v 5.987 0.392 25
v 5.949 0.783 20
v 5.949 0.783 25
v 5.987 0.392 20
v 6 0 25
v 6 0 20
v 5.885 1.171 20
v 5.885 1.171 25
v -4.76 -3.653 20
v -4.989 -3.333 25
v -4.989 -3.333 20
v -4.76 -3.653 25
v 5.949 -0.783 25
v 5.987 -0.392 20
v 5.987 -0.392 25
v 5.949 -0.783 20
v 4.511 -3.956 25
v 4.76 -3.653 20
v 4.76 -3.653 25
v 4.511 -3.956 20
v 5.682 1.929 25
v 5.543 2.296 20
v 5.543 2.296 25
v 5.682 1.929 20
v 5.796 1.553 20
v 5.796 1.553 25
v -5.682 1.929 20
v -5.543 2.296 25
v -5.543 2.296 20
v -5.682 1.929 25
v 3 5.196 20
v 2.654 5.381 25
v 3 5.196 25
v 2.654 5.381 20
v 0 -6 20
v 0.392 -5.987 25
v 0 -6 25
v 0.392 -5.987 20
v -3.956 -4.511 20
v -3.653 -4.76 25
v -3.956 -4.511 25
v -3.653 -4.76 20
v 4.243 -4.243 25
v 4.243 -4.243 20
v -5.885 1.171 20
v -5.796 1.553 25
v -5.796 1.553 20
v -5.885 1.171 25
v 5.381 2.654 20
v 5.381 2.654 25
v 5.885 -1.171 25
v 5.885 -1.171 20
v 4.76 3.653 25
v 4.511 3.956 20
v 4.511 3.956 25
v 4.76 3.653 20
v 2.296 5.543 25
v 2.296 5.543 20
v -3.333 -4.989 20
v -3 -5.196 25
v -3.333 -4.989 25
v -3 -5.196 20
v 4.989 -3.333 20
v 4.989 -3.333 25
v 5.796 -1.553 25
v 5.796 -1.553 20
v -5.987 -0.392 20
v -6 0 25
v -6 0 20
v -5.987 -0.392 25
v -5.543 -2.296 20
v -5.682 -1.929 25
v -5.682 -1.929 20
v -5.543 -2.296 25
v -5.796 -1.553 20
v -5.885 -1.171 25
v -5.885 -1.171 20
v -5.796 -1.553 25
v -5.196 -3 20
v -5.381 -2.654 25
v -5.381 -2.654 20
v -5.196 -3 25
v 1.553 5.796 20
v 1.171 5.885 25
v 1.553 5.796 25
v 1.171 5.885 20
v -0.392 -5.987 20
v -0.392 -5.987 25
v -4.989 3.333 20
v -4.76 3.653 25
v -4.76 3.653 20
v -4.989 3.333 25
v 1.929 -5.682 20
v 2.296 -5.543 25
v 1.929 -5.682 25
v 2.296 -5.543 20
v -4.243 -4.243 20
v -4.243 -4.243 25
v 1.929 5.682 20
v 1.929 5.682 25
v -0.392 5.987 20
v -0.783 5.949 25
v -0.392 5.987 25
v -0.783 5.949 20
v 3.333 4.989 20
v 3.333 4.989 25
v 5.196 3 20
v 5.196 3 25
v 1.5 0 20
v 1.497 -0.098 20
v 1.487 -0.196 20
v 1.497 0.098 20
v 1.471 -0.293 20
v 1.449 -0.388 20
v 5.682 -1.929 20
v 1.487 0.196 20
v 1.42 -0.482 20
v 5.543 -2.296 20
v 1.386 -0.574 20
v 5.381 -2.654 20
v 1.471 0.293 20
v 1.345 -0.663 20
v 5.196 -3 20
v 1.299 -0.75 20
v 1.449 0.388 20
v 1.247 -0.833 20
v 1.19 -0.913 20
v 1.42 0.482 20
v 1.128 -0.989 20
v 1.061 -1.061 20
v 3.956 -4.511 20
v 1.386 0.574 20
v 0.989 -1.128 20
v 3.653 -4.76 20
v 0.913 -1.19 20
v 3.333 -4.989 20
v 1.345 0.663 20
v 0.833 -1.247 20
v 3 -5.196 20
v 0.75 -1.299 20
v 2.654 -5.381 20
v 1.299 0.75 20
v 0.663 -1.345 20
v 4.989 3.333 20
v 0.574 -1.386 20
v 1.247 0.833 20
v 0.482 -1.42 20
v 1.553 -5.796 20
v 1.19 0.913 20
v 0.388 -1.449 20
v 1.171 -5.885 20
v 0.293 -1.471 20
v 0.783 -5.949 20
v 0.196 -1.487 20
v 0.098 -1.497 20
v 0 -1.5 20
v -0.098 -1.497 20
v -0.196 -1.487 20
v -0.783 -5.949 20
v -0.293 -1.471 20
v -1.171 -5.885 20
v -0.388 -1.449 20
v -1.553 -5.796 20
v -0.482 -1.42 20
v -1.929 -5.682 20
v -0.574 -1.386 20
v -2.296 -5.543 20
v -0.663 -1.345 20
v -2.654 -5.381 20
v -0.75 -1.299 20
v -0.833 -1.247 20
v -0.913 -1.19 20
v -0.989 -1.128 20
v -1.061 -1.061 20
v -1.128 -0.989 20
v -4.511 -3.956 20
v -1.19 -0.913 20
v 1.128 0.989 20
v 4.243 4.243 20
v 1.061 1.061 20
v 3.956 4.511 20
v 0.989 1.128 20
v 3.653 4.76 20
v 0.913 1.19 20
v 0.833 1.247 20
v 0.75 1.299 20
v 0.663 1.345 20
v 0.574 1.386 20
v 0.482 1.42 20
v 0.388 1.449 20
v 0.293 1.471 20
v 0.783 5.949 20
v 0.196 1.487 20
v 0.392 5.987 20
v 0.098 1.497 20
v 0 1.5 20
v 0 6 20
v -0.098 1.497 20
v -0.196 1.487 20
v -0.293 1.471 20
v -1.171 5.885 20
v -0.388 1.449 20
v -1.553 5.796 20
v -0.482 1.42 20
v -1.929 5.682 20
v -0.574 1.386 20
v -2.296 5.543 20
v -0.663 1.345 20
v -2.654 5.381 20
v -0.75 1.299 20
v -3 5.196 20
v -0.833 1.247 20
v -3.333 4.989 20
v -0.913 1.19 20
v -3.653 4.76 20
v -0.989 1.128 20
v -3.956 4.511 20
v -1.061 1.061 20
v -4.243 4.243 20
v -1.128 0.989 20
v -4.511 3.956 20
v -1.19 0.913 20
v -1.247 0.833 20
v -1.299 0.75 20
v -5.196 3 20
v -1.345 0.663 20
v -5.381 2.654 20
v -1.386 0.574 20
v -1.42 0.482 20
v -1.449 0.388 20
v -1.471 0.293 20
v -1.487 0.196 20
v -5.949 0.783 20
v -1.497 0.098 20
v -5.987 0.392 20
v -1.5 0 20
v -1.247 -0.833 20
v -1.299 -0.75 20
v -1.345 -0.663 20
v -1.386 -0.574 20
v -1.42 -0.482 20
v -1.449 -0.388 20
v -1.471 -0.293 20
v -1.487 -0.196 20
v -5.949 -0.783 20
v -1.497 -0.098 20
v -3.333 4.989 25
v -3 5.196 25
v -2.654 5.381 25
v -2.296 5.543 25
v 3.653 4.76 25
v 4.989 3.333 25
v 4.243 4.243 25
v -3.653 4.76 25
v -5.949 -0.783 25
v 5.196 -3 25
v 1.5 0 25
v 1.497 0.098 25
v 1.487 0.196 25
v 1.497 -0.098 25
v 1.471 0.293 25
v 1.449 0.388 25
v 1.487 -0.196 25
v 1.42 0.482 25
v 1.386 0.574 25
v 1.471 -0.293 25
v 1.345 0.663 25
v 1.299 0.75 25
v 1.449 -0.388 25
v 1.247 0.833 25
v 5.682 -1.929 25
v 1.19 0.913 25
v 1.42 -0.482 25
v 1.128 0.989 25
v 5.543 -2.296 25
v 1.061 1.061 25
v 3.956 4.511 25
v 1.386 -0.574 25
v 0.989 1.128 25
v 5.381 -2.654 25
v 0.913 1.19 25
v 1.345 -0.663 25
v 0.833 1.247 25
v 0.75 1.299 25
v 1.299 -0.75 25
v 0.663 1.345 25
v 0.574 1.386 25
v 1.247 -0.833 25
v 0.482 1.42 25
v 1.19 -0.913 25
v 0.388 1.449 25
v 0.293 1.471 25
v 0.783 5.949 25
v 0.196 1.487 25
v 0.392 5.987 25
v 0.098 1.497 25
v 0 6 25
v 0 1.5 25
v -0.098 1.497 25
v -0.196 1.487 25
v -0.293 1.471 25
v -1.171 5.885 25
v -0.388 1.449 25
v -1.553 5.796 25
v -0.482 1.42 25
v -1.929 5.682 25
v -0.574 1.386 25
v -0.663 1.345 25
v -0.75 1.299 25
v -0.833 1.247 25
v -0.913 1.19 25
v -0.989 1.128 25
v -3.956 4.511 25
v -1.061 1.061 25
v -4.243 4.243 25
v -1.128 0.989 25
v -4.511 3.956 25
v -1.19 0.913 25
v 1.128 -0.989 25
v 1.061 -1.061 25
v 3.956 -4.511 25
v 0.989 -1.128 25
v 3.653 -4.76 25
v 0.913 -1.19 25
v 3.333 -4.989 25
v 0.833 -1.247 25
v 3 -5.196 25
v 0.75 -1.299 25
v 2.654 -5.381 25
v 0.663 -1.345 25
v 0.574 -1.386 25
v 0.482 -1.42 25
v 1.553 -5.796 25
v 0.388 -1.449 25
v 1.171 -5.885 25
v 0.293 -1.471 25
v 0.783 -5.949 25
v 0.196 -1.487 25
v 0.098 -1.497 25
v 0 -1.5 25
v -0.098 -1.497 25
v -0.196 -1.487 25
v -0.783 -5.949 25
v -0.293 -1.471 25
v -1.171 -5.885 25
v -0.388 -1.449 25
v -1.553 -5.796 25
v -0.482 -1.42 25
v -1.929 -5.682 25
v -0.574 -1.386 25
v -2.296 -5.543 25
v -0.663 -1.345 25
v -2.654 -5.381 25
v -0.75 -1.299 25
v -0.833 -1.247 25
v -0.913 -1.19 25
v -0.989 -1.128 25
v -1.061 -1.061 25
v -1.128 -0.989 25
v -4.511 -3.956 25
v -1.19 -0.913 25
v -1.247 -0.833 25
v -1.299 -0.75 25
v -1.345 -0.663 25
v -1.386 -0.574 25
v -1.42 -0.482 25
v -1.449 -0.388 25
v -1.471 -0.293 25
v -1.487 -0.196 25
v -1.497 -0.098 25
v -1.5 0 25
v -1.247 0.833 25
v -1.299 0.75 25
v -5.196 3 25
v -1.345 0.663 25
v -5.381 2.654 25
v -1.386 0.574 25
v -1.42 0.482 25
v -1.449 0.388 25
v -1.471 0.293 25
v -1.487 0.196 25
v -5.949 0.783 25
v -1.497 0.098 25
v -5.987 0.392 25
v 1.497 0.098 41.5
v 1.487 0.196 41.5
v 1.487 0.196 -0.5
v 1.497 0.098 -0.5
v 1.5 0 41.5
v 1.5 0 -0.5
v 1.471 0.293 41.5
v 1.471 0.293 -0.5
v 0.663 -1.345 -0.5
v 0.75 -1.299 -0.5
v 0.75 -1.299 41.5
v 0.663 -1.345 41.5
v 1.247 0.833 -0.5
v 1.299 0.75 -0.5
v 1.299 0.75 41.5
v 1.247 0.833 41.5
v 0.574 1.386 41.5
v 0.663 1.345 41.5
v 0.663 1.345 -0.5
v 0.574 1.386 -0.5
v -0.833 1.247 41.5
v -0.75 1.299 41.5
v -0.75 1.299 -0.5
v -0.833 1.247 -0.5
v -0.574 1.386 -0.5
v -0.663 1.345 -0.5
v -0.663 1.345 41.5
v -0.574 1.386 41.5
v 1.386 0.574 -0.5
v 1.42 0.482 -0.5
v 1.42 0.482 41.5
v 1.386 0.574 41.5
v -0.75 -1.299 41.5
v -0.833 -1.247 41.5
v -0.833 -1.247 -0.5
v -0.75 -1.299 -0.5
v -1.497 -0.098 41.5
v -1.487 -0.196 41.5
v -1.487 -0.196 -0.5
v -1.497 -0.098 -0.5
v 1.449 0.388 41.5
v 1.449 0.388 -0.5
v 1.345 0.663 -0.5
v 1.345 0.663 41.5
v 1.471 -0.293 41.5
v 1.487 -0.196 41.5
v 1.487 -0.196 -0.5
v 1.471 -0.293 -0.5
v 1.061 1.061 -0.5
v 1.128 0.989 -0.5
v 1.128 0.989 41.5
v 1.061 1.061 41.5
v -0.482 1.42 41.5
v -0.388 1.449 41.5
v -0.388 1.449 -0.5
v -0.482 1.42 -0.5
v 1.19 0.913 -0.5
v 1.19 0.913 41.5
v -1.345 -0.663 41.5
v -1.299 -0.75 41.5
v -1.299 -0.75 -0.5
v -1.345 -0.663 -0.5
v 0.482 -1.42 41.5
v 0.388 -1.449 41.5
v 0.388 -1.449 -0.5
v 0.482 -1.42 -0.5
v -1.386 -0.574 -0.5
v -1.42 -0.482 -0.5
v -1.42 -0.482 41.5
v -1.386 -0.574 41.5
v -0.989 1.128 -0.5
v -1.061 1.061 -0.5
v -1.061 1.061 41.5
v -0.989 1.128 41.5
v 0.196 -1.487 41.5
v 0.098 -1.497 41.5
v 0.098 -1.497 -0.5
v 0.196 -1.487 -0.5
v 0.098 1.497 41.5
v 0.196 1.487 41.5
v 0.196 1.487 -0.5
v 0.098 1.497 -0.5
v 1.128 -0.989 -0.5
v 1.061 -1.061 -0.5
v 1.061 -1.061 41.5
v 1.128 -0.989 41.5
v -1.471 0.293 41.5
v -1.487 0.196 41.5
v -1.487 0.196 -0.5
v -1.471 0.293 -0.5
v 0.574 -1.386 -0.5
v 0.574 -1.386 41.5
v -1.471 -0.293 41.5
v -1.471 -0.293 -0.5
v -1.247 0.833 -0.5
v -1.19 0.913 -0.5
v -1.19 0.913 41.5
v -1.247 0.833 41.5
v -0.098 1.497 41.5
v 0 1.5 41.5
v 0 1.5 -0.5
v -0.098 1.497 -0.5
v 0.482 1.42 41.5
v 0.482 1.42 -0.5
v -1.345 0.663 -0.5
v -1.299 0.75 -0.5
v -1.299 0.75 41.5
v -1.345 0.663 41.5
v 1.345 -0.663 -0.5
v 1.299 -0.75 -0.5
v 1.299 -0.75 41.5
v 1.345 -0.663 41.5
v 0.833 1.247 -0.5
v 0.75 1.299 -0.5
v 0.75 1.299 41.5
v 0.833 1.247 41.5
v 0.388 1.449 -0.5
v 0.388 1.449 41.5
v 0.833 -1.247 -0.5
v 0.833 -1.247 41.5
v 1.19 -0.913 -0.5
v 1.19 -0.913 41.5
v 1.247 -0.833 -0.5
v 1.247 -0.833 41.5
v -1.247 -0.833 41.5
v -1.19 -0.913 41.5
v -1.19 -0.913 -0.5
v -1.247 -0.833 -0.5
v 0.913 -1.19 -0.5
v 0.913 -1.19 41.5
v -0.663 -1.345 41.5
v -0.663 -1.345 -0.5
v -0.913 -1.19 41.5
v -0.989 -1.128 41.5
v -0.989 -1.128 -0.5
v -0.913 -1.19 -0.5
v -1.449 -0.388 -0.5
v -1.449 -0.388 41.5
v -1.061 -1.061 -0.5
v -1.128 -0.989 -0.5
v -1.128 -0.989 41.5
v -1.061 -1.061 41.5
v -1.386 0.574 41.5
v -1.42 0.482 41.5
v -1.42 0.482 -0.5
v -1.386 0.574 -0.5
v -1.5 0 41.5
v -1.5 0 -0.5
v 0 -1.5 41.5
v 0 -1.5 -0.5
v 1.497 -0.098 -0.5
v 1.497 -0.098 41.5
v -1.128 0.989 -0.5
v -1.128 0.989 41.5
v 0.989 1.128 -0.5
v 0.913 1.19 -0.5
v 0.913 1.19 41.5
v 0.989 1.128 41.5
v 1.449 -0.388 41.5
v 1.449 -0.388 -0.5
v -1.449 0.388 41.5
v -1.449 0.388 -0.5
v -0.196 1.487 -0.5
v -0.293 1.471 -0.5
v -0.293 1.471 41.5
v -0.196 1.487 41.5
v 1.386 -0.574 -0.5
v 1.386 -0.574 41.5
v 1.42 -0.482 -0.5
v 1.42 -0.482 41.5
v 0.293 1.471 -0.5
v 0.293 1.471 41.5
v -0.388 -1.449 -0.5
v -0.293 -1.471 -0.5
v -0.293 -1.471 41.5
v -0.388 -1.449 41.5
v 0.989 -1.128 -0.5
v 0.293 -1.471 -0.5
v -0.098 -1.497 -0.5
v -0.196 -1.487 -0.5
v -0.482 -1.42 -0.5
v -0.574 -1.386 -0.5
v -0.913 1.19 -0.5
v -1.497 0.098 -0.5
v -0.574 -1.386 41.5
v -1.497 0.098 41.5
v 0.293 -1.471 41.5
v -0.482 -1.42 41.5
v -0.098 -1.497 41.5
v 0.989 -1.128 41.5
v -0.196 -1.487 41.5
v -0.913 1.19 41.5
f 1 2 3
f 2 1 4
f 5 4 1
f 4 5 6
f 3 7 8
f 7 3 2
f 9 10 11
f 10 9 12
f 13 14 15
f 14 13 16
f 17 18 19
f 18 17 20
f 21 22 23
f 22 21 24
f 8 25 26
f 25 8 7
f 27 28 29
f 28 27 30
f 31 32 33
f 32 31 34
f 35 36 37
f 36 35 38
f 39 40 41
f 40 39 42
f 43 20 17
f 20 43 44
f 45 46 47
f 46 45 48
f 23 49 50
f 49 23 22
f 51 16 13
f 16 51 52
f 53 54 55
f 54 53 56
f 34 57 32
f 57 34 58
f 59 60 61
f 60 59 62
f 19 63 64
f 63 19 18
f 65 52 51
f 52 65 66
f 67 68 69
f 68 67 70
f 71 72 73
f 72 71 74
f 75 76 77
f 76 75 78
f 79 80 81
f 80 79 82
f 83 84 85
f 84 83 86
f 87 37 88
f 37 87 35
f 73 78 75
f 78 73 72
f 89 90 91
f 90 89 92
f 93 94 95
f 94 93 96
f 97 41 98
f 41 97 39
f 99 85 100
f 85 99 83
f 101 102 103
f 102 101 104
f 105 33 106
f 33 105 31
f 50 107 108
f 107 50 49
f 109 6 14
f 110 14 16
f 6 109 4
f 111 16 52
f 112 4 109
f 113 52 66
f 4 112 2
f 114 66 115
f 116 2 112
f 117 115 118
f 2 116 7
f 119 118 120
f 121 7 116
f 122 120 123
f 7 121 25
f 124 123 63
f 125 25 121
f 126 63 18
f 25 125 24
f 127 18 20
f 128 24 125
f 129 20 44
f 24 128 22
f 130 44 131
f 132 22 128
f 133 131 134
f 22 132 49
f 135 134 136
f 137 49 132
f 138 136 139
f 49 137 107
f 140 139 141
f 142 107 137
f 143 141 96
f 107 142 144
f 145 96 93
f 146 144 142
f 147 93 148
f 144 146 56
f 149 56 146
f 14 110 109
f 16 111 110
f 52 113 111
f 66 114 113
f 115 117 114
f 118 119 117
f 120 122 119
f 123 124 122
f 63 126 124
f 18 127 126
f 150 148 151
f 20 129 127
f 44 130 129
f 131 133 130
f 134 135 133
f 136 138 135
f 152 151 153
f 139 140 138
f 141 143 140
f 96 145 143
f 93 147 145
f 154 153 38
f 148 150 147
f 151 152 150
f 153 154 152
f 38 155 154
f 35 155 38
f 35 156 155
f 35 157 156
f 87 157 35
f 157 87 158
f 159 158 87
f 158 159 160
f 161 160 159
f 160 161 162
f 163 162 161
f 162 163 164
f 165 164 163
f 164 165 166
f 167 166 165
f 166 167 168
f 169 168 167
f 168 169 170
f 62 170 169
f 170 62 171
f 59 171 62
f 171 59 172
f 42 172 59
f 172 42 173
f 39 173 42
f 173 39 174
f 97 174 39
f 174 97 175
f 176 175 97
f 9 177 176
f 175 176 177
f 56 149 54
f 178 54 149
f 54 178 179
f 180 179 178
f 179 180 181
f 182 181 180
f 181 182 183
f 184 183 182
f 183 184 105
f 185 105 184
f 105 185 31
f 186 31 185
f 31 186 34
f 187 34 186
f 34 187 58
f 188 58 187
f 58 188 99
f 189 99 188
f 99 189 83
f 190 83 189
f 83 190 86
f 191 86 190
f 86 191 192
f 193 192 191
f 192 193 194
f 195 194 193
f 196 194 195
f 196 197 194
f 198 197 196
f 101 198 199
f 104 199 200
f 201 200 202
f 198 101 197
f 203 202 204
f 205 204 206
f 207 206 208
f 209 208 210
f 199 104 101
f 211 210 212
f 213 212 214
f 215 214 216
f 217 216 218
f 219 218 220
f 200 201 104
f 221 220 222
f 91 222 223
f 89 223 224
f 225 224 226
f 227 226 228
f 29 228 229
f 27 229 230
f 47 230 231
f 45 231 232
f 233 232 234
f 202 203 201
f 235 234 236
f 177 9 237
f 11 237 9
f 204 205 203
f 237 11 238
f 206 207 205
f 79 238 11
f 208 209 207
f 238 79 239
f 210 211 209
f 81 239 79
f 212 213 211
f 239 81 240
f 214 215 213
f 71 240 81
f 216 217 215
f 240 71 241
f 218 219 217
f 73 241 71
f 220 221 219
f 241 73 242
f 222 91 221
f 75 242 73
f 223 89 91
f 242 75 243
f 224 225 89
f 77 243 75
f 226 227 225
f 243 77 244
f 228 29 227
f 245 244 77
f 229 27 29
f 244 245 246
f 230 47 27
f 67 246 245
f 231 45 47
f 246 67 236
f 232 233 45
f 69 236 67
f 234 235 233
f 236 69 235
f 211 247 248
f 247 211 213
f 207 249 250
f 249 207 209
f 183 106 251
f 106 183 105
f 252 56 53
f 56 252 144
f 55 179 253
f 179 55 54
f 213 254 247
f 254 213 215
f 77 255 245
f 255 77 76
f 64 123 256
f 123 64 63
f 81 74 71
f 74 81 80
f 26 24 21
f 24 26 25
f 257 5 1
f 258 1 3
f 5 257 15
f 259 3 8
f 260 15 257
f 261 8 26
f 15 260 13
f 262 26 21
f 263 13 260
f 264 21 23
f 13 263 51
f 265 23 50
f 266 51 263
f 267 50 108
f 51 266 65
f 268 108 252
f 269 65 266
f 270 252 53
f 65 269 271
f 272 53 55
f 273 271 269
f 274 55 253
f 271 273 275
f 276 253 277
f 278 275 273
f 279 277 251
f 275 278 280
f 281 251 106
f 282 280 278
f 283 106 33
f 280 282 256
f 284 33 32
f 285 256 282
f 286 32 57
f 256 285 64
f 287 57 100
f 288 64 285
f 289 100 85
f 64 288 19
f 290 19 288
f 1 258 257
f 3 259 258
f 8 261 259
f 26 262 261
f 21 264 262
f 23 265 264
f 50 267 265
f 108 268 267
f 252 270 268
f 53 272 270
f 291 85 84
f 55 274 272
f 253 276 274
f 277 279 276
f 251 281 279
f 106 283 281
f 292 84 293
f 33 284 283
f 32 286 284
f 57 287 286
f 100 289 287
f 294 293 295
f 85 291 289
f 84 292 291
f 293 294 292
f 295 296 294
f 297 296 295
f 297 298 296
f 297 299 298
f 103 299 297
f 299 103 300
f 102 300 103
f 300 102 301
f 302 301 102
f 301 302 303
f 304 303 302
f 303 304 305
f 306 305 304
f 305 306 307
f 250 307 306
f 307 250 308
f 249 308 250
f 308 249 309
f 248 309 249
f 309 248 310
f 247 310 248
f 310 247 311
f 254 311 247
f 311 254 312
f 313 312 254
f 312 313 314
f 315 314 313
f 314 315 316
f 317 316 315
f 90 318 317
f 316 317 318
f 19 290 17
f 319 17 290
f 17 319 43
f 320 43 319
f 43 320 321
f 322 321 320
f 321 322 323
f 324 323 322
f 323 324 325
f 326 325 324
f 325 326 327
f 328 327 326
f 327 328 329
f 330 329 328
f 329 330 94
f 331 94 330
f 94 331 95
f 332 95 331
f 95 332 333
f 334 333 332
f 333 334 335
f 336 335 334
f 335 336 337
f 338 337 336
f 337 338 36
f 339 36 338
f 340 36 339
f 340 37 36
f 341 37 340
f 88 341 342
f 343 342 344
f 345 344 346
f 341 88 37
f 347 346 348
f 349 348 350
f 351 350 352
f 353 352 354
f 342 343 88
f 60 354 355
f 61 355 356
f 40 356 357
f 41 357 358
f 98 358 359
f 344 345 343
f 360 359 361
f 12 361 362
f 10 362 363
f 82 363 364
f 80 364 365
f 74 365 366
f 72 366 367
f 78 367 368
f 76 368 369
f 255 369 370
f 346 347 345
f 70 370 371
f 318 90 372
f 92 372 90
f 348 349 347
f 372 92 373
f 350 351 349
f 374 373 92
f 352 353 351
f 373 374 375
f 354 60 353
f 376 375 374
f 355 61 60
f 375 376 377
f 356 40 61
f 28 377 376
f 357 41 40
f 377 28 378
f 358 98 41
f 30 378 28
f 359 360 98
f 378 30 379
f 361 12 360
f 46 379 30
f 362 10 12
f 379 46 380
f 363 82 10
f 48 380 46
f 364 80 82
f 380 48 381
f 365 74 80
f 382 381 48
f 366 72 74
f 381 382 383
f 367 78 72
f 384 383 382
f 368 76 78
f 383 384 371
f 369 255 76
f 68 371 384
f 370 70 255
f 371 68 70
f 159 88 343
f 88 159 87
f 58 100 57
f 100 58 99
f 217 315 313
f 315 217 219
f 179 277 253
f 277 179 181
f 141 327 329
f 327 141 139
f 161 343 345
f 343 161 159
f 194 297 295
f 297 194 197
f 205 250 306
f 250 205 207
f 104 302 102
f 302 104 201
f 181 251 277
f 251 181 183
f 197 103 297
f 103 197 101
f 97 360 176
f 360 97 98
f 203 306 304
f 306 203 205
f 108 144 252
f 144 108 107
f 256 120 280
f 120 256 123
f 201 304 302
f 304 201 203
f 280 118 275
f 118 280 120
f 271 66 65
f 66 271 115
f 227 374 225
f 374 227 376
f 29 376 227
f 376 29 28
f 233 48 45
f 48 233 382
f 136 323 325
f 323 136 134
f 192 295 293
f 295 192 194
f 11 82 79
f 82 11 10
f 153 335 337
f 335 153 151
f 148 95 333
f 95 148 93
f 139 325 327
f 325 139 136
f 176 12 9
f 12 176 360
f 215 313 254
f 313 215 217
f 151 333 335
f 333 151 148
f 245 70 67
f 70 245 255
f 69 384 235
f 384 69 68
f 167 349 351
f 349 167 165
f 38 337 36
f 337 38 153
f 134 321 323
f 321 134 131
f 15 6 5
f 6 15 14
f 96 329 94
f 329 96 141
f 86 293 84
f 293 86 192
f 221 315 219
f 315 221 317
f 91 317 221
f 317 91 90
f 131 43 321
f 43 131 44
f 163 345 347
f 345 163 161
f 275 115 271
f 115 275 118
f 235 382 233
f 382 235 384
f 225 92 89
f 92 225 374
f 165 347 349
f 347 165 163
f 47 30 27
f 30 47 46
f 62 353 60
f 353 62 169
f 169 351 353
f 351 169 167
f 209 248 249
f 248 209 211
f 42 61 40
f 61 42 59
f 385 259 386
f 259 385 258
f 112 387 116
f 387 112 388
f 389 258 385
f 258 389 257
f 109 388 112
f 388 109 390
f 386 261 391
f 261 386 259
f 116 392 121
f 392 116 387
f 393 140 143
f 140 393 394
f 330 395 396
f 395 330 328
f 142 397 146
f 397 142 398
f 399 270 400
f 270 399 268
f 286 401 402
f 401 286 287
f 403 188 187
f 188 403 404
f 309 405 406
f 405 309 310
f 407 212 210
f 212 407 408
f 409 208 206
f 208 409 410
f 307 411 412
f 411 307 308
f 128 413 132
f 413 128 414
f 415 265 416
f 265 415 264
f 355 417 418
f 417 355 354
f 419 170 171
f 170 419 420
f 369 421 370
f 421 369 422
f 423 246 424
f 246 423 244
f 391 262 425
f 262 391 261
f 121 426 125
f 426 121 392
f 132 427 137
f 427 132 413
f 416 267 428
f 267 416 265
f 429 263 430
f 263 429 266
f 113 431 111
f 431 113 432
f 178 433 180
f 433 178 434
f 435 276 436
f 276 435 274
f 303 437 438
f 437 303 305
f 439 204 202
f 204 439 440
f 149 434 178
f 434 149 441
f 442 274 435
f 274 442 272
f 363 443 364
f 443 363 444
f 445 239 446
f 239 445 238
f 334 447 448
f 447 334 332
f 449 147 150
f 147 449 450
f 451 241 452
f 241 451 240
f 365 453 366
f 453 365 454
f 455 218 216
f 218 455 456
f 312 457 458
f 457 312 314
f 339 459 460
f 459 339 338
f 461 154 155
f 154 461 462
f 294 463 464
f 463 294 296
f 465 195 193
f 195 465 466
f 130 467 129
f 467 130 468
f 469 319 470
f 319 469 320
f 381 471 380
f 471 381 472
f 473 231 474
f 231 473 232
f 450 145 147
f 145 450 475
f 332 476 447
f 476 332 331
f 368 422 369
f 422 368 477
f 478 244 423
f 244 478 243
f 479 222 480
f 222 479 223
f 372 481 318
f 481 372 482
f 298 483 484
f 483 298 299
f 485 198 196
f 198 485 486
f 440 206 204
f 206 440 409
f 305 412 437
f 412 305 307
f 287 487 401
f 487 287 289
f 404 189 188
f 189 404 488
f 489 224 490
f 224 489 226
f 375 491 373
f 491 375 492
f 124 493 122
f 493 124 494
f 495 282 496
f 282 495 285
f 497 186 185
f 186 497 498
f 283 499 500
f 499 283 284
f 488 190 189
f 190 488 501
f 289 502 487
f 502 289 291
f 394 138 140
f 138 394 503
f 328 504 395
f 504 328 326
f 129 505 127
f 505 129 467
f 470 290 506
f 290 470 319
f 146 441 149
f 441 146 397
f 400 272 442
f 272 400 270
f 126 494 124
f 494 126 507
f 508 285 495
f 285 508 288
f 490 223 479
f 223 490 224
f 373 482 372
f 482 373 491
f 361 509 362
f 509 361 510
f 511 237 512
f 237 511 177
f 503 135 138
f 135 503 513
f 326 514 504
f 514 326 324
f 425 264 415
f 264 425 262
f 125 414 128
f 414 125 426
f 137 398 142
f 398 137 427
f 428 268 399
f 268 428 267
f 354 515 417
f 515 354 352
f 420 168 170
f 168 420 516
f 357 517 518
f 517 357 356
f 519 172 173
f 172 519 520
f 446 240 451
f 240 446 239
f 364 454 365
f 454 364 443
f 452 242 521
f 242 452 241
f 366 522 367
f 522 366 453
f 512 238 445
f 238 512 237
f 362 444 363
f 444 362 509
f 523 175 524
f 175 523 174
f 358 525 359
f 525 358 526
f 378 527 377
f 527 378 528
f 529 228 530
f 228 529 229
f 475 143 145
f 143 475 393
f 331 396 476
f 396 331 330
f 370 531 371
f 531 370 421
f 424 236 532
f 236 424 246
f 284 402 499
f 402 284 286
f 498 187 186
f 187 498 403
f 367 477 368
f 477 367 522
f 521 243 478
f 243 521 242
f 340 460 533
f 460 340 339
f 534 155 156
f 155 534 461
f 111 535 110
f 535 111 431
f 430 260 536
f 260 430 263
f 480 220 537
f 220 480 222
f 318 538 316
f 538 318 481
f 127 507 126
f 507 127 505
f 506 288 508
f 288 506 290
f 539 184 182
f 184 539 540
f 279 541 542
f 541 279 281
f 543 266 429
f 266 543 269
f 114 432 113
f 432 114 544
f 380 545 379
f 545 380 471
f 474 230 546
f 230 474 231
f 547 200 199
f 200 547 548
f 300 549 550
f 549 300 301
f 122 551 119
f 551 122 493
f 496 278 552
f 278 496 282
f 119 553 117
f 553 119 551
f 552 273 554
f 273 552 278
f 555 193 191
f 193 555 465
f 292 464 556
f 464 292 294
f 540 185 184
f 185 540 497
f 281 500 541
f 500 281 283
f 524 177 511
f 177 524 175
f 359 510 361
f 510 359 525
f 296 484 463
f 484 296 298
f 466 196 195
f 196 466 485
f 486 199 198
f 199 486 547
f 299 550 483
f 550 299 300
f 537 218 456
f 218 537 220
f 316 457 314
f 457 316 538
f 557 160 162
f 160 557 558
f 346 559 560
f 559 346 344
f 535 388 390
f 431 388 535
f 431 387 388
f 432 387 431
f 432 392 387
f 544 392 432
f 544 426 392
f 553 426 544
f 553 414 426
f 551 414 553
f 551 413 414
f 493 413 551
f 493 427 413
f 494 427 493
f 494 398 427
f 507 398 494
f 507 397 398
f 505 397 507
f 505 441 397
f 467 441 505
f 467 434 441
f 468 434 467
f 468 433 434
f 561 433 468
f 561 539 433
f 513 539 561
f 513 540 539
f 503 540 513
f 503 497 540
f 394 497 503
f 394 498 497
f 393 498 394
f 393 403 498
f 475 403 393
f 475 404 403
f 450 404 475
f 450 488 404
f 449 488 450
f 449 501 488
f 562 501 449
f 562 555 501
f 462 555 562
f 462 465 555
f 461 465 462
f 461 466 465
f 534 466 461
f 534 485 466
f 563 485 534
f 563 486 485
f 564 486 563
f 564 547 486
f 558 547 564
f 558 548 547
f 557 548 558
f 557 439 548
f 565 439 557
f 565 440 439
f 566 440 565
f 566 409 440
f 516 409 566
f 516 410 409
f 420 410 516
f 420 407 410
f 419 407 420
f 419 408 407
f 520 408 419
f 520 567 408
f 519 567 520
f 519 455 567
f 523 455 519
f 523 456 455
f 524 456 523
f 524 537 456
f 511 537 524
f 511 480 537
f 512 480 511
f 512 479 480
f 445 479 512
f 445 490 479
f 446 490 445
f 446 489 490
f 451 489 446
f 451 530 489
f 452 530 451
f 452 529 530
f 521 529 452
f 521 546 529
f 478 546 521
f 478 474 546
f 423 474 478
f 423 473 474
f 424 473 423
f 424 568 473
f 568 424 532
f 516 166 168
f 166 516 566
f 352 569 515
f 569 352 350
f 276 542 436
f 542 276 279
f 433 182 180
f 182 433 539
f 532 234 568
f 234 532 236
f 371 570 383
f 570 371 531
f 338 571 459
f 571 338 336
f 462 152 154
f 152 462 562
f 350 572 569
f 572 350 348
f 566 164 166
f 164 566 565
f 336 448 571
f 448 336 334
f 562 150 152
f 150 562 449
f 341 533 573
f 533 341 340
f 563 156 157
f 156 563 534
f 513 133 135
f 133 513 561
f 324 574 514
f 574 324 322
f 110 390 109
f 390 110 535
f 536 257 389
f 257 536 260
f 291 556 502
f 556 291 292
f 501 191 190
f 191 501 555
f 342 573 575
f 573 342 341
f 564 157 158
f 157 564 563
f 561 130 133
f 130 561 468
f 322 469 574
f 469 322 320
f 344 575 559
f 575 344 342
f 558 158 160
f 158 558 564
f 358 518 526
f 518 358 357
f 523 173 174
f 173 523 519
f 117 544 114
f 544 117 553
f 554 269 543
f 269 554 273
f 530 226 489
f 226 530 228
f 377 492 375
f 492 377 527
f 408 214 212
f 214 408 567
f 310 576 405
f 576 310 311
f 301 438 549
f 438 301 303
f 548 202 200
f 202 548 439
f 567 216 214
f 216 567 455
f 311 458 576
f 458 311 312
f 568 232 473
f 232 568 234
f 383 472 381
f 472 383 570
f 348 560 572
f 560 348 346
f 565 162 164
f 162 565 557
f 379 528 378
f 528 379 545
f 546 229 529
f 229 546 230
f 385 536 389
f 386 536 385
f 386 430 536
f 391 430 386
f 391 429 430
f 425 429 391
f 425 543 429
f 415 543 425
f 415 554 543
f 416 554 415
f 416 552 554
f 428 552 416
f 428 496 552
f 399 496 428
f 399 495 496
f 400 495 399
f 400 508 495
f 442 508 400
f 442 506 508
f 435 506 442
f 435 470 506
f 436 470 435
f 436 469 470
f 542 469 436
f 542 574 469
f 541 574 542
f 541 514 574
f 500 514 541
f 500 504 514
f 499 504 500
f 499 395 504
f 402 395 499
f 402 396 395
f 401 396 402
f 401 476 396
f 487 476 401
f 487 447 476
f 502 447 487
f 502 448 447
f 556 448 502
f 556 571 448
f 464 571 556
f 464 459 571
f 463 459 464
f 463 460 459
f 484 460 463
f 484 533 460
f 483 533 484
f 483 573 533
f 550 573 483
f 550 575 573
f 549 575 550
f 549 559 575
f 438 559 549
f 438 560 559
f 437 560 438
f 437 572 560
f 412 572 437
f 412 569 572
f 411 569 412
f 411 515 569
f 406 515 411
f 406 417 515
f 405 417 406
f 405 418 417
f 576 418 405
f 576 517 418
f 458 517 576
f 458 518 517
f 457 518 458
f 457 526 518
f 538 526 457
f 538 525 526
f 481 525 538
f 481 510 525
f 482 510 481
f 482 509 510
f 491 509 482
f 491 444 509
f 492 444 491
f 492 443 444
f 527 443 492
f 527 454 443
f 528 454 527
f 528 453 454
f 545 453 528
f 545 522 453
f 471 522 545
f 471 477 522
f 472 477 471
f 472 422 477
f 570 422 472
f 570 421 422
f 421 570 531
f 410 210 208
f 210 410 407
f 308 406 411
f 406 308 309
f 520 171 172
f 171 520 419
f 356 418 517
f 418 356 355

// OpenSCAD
// Hose-barb reducer: 8 mm ID -> 5 mm ID
// Print orientation: standing upright along Z

$fn = 96;

// ---- Dimensions (mm) ----
id1      = 8;     // 8 mm tubing inner diameter
id2      = 5;     // 5 mm tubing inner diameter
bore     = 3;     // through-bore diameter
barb_h8  = 10;    // height of 8 mm barbs
barb_h5  = 8;     // height of 5 mm barbs
collar_d = 12;    // collar diameter
z0       = 0;     // start of barbs
z1       = 20;    // start of collar
z2       = 25;    // end of collar
z3       = 41;    // end of 5 mm barbs
eps      = 0.5;   // overlap for clean booleans

// ---- Derived ----
od8_bot = 7.5;
od8_top = 9.5;
od5_bot = 6.5;
od5_top = 5.0;

module barb8() {
    hull() {
        translate([0, 0, z0])
            cylinder(d = od8_bot, h = barb_h8);
        translate([0, 0, z1 - eps])
            cylinder(d = od8_top, h = eps);
    }
}

module barb5() {
    hull() {
        translate([0, 0, z2])
            cylinder(d = od5_bot, h = barb_h5);
        translate([0, 0, z3 - eps])
            cylinder(d = od5_top, h = eps);
    }
}

module through() {
    translate([0, 0, -eps])
        cylinder(d = bore, h = z3 + 2 * eps);
}

union() {
    // 8 mm barbs
    for (i = [0 : 1])
        translate([0, 0, z0 + i * barb_h8])
            cylinder(d = [od8_bot, od8_top], h = barb_h8, $fn = 96);

    // collar
    translate([0, 0, z1])
        cylinder(d = collar_d, h = z2 - z1);

    // 5 mm barbs
    for (i = [0 : 1])
        translate([0, 0, z2 + i * barb_h5])
            cylinder(d = [od5_bot, od5_top], h = barb_h5, $fn = 96);

    // through bore
    through();
}
